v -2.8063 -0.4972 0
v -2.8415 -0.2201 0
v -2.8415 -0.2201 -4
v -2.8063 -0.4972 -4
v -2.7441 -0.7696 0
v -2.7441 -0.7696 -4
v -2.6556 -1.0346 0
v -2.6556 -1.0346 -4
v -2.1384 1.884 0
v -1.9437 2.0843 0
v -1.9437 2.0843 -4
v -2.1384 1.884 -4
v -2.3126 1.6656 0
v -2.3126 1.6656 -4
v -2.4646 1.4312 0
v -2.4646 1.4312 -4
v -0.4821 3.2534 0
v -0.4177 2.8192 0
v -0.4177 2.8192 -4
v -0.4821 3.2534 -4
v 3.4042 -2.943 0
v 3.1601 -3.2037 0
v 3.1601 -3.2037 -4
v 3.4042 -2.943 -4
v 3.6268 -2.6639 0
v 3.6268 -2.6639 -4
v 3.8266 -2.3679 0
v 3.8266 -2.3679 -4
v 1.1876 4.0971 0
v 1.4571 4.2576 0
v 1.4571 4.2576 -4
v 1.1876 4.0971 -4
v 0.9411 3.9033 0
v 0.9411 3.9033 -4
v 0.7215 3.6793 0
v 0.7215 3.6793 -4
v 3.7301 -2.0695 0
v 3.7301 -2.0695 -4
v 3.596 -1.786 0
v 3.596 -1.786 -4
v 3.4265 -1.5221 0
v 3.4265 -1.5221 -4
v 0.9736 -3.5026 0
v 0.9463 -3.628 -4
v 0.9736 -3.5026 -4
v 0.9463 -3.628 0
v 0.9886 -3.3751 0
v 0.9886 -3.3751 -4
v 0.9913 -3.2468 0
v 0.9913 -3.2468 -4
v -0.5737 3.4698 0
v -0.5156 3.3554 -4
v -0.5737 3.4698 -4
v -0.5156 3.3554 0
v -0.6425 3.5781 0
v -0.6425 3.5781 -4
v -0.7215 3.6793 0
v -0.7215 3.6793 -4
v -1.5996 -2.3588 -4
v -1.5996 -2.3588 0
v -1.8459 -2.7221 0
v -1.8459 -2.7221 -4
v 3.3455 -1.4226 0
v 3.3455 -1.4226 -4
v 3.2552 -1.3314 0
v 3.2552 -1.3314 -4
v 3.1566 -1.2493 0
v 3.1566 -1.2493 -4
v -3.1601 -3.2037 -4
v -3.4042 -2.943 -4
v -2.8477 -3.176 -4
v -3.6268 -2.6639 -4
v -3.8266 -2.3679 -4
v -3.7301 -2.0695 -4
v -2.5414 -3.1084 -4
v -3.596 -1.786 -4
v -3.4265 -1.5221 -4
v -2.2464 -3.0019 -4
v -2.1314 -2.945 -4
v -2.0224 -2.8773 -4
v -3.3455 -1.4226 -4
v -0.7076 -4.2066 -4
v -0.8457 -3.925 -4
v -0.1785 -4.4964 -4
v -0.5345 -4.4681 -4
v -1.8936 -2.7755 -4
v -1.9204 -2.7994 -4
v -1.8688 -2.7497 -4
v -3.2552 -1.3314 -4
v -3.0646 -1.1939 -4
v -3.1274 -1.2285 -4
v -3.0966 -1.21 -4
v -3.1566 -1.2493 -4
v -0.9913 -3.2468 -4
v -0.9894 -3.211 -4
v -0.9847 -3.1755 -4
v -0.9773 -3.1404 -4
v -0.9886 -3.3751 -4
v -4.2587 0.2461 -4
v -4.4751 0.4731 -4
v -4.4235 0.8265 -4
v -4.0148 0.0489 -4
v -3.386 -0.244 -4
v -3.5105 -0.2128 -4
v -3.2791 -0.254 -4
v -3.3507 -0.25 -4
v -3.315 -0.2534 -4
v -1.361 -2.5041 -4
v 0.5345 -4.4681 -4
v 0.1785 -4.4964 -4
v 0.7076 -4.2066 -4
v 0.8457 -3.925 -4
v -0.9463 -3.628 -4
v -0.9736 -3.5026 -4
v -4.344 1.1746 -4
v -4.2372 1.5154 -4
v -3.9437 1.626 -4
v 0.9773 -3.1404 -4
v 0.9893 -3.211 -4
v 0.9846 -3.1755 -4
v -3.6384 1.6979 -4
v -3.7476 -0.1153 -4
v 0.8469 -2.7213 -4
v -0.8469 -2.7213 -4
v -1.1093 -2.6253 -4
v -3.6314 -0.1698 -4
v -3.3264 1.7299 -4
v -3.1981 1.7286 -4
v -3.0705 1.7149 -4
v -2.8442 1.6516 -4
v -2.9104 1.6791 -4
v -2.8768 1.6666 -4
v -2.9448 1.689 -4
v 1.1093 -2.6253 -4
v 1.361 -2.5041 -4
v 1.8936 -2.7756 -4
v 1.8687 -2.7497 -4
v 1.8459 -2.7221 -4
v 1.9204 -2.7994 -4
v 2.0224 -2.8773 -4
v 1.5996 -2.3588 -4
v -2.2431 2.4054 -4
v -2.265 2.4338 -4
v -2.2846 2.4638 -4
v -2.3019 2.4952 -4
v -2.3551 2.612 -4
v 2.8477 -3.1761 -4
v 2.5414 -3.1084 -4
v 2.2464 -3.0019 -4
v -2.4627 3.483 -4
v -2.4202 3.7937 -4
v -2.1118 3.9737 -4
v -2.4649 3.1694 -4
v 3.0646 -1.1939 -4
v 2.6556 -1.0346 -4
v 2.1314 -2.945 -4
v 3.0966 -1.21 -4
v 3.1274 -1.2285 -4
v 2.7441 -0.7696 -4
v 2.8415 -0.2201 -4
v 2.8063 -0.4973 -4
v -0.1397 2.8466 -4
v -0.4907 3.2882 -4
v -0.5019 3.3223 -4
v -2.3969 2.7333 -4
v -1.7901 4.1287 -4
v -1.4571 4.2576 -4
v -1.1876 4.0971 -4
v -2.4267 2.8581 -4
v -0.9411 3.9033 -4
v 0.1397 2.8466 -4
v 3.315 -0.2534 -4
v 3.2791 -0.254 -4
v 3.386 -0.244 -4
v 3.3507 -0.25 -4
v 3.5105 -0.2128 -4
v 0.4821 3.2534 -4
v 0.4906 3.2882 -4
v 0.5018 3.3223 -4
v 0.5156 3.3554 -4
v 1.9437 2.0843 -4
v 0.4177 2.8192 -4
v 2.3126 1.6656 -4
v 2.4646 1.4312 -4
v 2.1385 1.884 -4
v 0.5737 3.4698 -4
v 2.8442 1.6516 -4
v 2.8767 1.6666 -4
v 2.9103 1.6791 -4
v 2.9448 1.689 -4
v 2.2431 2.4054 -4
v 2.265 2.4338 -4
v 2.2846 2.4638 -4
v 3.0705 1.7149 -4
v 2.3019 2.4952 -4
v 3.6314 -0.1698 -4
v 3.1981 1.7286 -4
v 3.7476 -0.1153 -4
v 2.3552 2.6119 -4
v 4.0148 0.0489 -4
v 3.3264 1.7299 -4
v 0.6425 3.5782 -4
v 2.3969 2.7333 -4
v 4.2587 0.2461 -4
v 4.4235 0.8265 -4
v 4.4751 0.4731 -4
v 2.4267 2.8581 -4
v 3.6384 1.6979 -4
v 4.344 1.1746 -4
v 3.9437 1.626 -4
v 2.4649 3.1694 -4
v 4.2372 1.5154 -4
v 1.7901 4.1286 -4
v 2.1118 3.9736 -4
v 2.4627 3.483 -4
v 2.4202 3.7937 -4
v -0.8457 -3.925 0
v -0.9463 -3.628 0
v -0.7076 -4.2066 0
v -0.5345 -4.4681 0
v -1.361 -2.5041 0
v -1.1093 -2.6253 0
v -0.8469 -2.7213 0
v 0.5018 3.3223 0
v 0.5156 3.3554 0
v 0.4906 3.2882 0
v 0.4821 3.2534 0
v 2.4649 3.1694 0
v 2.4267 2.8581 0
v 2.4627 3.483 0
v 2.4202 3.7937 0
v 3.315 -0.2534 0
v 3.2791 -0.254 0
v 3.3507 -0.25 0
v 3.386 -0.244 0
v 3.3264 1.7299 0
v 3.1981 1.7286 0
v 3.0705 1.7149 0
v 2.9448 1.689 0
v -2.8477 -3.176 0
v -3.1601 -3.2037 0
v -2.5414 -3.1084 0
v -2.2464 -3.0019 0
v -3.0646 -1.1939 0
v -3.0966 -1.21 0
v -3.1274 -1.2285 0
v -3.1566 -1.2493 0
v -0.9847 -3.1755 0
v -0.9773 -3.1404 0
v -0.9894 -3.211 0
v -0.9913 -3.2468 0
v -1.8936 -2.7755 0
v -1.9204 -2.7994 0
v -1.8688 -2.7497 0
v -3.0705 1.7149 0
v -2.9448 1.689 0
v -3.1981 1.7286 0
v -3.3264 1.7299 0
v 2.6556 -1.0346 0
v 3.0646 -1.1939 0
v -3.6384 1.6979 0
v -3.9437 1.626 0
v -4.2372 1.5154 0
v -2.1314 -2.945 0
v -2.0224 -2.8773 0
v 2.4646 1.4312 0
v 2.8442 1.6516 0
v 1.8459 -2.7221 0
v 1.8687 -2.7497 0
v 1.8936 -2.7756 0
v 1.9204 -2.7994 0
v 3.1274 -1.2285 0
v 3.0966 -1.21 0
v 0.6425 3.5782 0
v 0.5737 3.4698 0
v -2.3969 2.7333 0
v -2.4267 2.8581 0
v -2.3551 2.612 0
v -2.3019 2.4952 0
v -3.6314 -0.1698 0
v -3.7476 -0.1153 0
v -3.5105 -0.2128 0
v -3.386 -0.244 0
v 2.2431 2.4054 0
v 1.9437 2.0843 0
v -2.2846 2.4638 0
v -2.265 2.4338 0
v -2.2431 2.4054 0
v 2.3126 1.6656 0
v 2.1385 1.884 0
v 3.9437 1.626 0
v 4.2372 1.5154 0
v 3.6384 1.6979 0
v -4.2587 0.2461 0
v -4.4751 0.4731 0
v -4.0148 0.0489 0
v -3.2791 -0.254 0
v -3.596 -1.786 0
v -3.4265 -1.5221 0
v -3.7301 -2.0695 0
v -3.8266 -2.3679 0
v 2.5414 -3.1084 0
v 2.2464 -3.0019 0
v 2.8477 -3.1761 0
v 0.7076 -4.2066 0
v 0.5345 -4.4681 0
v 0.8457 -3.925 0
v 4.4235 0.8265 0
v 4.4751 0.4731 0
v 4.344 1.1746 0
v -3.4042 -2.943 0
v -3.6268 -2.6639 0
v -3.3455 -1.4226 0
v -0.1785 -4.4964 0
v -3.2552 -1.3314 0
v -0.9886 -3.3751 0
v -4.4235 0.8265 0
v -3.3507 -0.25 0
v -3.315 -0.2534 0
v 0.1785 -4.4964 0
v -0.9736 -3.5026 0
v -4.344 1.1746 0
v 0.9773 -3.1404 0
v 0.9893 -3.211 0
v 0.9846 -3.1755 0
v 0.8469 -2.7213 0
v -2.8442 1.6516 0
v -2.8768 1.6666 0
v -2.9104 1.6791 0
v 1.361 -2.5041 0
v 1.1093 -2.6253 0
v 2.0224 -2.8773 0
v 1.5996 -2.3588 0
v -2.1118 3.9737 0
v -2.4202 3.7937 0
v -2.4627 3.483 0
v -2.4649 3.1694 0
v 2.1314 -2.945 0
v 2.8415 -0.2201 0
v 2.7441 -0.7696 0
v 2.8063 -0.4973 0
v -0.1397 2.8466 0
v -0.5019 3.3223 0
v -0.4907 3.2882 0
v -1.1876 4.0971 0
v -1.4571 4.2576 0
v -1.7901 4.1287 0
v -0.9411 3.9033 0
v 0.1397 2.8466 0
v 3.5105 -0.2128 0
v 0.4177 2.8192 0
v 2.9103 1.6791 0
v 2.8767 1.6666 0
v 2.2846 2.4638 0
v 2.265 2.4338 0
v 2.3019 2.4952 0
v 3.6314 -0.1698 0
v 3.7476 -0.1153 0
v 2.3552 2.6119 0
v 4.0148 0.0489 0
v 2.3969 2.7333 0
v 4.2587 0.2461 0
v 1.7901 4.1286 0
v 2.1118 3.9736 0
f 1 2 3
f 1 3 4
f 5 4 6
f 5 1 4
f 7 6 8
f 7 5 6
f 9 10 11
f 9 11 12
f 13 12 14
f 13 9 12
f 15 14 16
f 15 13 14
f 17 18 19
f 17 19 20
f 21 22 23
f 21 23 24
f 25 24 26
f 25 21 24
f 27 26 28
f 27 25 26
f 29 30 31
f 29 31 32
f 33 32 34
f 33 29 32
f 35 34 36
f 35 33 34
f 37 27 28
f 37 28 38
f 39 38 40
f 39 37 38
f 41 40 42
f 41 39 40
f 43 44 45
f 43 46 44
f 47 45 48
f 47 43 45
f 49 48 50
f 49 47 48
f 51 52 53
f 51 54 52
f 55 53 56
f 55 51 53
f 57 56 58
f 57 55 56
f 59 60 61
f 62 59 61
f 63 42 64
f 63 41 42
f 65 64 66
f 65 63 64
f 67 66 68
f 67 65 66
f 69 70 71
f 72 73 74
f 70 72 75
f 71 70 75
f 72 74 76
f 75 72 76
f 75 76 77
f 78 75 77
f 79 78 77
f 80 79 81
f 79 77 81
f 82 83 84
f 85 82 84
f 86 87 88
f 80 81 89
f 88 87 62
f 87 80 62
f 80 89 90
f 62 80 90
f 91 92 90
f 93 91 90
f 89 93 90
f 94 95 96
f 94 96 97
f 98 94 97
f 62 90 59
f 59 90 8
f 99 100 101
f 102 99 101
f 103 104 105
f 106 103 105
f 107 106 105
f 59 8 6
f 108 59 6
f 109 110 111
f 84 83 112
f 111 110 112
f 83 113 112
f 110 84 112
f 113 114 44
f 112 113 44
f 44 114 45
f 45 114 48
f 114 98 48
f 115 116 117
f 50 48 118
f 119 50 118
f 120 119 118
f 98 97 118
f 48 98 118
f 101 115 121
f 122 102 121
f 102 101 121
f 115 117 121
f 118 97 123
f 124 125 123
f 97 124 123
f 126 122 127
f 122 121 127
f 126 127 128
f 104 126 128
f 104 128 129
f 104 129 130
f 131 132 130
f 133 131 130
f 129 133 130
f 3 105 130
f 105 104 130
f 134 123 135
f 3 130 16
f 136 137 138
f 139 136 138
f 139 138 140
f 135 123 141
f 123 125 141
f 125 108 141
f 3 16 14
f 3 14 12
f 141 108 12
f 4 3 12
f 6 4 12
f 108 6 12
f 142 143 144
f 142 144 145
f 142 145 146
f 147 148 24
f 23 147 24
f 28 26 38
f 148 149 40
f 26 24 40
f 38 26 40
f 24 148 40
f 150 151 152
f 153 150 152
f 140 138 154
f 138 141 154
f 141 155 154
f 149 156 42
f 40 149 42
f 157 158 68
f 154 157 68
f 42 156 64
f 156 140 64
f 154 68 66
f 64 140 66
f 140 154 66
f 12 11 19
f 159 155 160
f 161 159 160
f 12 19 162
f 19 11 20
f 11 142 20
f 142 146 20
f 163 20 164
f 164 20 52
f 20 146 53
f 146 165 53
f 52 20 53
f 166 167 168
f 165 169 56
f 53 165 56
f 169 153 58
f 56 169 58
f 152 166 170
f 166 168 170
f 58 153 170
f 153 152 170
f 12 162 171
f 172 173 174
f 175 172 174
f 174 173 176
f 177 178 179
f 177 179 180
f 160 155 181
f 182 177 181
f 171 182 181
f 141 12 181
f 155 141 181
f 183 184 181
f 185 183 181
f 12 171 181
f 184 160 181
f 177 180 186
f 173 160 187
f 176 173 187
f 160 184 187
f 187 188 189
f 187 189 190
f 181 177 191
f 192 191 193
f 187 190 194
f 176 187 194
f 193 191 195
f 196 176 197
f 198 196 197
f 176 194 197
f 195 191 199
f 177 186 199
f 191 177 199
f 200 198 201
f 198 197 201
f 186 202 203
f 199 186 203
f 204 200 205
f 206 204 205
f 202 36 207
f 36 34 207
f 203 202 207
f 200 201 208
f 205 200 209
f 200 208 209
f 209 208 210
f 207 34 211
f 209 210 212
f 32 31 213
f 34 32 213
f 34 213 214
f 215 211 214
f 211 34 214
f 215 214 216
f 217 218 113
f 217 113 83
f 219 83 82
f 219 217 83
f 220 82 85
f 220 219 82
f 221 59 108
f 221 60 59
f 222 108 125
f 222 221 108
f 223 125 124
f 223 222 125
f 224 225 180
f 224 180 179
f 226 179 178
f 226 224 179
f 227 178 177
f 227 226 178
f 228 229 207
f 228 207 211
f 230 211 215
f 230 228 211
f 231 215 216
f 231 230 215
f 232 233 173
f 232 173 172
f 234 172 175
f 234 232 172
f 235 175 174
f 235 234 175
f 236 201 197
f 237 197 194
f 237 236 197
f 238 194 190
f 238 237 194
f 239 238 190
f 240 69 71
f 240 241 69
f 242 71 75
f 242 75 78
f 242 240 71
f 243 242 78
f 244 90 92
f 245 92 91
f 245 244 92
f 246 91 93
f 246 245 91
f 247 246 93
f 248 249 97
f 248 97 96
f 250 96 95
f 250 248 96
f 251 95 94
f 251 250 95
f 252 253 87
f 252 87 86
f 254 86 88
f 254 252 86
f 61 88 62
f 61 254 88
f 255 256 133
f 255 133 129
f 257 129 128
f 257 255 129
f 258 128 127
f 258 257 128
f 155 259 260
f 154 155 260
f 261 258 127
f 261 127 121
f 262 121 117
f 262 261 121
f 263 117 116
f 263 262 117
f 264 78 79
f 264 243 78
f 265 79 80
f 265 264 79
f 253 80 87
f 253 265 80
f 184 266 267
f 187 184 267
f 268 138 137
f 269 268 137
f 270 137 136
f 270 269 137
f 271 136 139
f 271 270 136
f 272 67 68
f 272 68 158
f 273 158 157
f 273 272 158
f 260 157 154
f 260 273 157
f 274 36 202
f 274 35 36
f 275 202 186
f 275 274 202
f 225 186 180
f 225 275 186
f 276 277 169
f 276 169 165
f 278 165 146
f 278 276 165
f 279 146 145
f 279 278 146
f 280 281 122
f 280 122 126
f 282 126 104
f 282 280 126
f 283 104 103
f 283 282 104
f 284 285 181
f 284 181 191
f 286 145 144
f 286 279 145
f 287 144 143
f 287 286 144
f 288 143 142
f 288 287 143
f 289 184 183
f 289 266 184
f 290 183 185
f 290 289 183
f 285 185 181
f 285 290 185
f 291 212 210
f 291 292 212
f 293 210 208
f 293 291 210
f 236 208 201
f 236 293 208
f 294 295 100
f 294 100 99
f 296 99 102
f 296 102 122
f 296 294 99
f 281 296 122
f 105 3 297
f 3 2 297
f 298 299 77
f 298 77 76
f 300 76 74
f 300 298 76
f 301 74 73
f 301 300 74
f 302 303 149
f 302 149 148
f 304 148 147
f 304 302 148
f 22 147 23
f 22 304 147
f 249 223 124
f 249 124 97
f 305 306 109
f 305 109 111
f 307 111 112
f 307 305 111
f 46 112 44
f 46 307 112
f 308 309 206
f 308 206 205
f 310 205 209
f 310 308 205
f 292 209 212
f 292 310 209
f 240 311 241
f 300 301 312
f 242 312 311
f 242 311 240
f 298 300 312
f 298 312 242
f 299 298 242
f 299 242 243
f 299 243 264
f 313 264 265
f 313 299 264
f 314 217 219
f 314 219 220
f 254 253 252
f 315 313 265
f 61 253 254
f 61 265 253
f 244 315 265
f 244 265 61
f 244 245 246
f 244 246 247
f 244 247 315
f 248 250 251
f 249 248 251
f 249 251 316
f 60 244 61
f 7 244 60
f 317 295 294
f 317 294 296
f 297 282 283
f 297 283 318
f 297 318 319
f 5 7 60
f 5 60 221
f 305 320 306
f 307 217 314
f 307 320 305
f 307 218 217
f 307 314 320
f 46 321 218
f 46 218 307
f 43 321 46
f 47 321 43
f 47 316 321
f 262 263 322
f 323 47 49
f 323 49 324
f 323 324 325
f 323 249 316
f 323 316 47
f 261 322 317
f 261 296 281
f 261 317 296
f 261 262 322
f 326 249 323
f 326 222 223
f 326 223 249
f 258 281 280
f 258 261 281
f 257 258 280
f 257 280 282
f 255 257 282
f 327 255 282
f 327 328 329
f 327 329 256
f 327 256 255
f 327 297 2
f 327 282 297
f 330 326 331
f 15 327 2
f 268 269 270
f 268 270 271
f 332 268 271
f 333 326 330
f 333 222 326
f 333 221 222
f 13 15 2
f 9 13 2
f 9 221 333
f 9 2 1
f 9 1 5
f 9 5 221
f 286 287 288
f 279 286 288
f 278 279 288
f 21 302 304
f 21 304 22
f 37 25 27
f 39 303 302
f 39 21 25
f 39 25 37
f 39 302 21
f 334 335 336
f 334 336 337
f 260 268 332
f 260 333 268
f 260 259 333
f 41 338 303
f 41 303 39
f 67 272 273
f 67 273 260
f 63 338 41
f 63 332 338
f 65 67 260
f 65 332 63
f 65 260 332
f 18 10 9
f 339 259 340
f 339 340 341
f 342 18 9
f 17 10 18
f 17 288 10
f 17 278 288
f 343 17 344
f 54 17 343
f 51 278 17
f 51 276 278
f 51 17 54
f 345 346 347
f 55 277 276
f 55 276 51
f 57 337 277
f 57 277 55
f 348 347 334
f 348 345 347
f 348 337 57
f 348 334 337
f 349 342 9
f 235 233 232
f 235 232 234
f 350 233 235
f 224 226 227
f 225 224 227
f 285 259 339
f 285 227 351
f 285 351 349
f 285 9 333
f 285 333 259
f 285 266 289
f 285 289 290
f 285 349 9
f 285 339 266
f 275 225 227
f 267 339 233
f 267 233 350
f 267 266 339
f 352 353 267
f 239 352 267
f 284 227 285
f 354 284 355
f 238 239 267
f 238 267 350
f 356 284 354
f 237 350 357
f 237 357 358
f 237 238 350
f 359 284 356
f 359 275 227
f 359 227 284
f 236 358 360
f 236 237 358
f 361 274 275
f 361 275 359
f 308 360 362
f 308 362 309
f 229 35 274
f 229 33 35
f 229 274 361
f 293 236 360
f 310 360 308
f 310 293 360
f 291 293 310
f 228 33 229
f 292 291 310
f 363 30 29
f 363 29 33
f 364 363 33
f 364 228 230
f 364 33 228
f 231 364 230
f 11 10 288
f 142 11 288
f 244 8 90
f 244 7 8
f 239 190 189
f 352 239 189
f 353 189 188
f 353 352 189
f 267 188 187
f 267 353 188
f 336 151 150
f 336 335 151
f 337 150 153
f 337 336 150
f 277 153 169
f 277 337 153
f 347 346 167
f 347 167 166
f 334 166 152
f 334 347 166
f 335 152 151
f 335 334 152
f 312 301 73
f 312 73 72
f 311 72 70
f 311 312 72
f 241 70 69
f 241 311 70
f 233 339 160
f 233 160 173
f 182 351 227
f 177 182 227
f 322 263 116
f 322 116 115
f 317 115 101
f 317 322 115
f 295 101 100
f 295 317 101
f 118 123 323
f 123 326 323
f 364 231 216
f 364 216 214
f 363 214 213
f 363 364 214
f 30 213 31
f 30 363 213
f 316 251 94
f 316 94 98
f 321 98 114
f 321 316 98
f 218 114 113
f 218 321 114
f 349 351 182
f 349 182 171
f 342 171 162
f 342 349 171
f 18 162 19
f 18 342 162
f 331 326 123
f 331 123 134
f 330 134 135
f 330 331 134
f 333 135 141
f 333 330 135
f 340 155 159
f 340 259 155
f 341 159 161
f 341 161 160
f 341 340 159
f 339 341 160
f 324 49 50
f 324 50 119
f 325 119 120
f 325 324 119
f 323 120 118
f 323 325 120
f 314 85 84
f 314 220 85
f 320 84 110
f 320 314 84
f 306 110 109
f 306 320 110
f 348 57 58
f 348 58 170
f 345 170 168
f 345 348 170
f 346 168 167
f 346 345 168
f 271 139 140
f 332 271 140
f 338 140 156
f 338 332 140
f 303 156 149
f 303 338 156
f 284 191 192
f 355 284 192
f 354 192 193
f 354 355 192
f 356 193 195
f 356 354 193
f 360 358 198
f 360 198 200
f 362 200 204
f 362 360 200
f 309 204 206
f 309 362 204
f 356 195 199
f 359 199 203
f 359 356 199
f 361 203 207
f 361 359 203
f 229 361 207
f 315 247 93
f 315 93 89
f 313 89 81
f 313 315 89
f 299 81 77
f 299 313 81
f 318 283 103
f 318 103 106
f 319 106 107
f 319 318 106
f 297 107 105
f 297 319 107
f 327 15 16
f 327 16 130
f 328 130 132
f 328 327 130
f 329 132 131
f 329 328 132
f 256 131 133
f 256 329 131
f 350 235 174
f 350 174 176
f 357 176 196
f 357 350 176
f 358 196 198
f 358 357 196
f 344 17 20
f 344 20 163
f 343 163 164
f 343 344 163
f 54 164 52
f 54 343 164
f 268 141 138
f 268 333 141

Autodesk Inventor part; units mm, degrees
ref_plane "YZ Plane" through (0, 0, 0) normal (1, 0, 0) x (0, 1, 0)
ref_plane "XZ Plane" through (0, 0, 0) normal (0, 1, 0) x (-1, 0, 0)
ref_plane "XY Plane" through (0, 0, 0) normal (0, 0, 1) x (1, 0, 0)
sketch "Sketch1" plane through (0, 0, 0) normal (0, 0, 1) x (1, 0, 0)
  arc A0 (0.5156, 3.3554) -> (0.4821, 3.2534) centre (0.9432, 3.1583) ccw
  arc A1 (0.7215, 3.6793) -> (0.5156, 3.3554) centre (1.7274, 2.8124) ccw
  arc A2 (1.4571, 4.2576) -> (0.7215, 3.6793) centre (2.5636, 2.0932) ccw
  arc A3 (-2.3019, 2.4952) -> (-2.2431, 2.4054) centre (-1.8812, 2.7066) ccw
  arc A4 (-2.4267, 2.8581) -> (-2.3019, 2.4952) centre (-1.1218, 3.104) ccw
  arc A5 (-2.4202, 3.7937) -> (-2.4267, 2.8581) centre (-0.0382, 3.3094) ccw
  arc A6 (-3.386, -0.244) -> (-3.2791, -0.254) centre (-3.289, 0.2168) ccw
  arc A7 (-3.7476, -0.1153) -> (-3.386, -0.244) centre (-3.1262, 1.0583) ccw
  arc A8 (-4.4751, 0.4731) -> (-3.7476, -0.1153) centre (-2.6112, 2.0335) ccw
  arc A9 (-1.9204, -2.7994) -> (-1.8459, -2.7221) centre (-2.2201, -2.4363) ccw
  arc A10 (-2.2464, -3.0019) -> (-1.9204, -2.7994) centre (-2.7766, -1.7844) ccw
  arc A11 (-3.1601, -3.2037) -> (-2.2464, -3.0019) centre (-3.2179, -0.7736) ccw
  arc A12 (0.9913, -3.2468) -> (0.9773, -3.1404) centre (0.5205, -3.2548) ccw
  arc A13 (0.9463, -3.628) -> (0.9913, -3.2468) centre (-0.3361, -3.2833) ccw
  arc A14 (0.5345, -4.4681) -> (0.9463, -3.628) centre (-1.4015, -2.9982) ccw
  arc A15 (3.1566, -1.2493) -> (3.0646, -1.1939) centre (2.8692, -1.6223) ccw
  arc A16 (3.4265, -1.5221) -> (3.1566, -1.2493) centre (2.3575, -2.3099) ccw
  arc A17 (3.8266, -2.3679) -> (3.4265, -1.5221) centre (1.4703, -2.9651) ccw
  arc A18 (2.9448, 1.689) -> (2.8442, 1.6516) centre (3.0573, 1.2317) ccw
  arc A19 (3.3264, 1.7299) -> (2.9448, 1.689) centre (3.2758, 0.4029) ccw
  arc A20 (4.2372, 1.5154) -> (3.3264, 1.7299) centre (3.2349, -0.6992) ccw
  arc A21 (-0.4821, 3.2534) -> (-0.5156, 3.3554) centre (-0.9432, 3.1583) ccw
  arc A22 (-0.5156, 3.3554) -> (-0.7215, 3.6793) centre (-1.7274, 2.8124) ccw
  arc A23 (-0.7215, 3.6793) -> (-1.4571, 4.2576) centre (-2.5636, 2.0932) ccw
  arc A24 (-2.8442, 1.6516) -> (-2.9448, 1.689) centre (-3.0573, 1.2317) ccw
  arc A25 (-2.9448, 1.689) -> (-3.3264, 1.7299) centre (-3.2758, 0.4029) ccw
  arc A26 (-3.3264, 1.7299) -> (-4.2372, 1.5154) centre (-3.2349, -0.6992) ccw
  arc A27 (-3.0646, -1.1939) -> (-3.1566, -1.2493) centre (-2.8692, -1.6223) ccw
  arc A28 (-3.1566, -1.2493) -> (-3.4265, -1.5221) centre (-2.3575, -2.3099) ccw
  arc A29 (-3.4265, -1.5221) -> (-3.8266, -2.3679) centre (-1.4703, -2.9651) ccw
  arc A30 (-0.9773, -3.1404) -> (-0.9913, -3.2468) centre (-0.5205, -3.2548) ccw
  arc A31 (-0.9913, -3.2468) -> (-0.9463, -3.628) centre (0.3361, -3.2833) ccw
  arc A32 (-0.9463, -3.628) -> (-0.5345, -4.4681) centre (1.4015, -2.9982) ccw
  arc A33 (1.8459, -2.7221) -> (1.9204, -2.7994) centre (2.2201, -2.4363) ccw
  arc A34 (1.9204, -2.7994) -> (2.2464, -3.0019) centre (2.7766, -1.7844) ccw
  arc A35 (2.2464, -3.0019) -> (3.1601, -3.2037) centre (3.2179, -0.7736) ccw
  arc A36 (3.2791, -0.254) -> (3.386, -0.244) centre (3.289, 0.2168) ccw
  arc A37 (3.386, -0.244) -> (3.7476, -0.1153) centre (3.1262, 1.0583) ccw
  arc A38 (3.7476, -0.1153) -> (4.4751, 0.4731) centre (2.6112, 2.0335) ccw
  arc A39 (2.2431, 2.4054) -> (2.3019, 2.4952) centre (1.8812, 2.7066) ccw
  arc A40 (2.3019, 2.4952) -> (2.4267, 2.8581) centre (1.1218, 3.104) ccw
  arc A41 (2.4267, 2.8581) -> (2.4202, 3.7937) centre (0.0382, 3.3094) ccw
  arc A42 (0.4177, 2.8192) -> (-0.4177, 2.8192) centre (0, 0) ccw
  arc A43 (-1.9437, 2.0843) -> (-2.4646, 1.4312) centre (0, 0) ccw
  arc A44 (-2.8415, -0.2201) -> (-2.6556, -1.0346) centre (0, 0) ccw
  arc A45 (-1.5996, -2.3588) -> (-0.8469, -2.7213) centre (0, 0) ccw
  arc A46 (0.8469, -2.7213) -> (1.5996, -2.3588) centre (0, 0) ccw
  arc A47 (2.6556, -1.0346) -> (2.8415, -0.2201) centre (0, 0) ccw
  arc A48 (2.4646, 1.4312) -> (1.9437, 2.0843) centre (0, 0) ccw
  arc A49 (-1.4571, 4.2576) -> (-2.4202, 3.7937) centre (0, 0) ccw
  arc A50 (-4.2372, 1.5154) -> (-4.4751, 0.4731) centre (0, 0) ccw
  arc A51 (-3.8266, -2.3679) -> (-3.1601, -3.2037) centre (0, 0) ccw
  arc A52 (-0.5345, -4.4681) -> (0.5345, -4.4681) centre (0, 0) ccw
  arc A53 (3.1601, -3.2037) -> (3.8266, -2.3679) centre (0, 0) ccw
  arc A54 (4.4751, 0.4731) -> (4.2372, 1.5154) centre (0, 0) ccw
  arc A55 (2.4202, 3.7937) -> (1.4571, 4.2576) centre (0, 0) ccw
  line L0 (0.4177, 2.8192) -> (0.4821, 3.2534)
  line L1 (-1.9437, 2.0843) -> (-2.2431, 2.4054)
  line L2 (-2.8415, -0.2201) -> (-3.2791, -0.254)
  line L3 (-1.5996, -2.3588) -> (-1.8459, -2.7221)
  line L4 (0.8469, -2.7213) -> (0.9773, -3.1404)
  line L5 (2.6556, -1.0346) -> (3.0646, -1.1939)
  line L6 (2.4646, 1.4312) -> (2.8442, 1.6516)
  line L7 (-0.4177, 2.8192) -> (-0.4821, 3.2534)
  line L8 (-2.4646, 1.4312) -> (-2.8442, 1.6516)
  line L9 (-2.6556, -1.0346) -> (-3.0646, -1.1939)
  line L10 (-0.8469, -2.7213) -> (-0.9773, -3.1404)
  line L11 (1.5996, -2.3588) -> (1.8459, -2.7221)
  line L12 (2.8415, -0.2201) -> (3.2791, -0.254)
  line L13 (1.9437, 2.0843) -> (2.2431, 2.4054)
extrude "Extrusion1" add sketch "Sketch1" against normal blind 4
properties part number "初段多段部分歯数7"
